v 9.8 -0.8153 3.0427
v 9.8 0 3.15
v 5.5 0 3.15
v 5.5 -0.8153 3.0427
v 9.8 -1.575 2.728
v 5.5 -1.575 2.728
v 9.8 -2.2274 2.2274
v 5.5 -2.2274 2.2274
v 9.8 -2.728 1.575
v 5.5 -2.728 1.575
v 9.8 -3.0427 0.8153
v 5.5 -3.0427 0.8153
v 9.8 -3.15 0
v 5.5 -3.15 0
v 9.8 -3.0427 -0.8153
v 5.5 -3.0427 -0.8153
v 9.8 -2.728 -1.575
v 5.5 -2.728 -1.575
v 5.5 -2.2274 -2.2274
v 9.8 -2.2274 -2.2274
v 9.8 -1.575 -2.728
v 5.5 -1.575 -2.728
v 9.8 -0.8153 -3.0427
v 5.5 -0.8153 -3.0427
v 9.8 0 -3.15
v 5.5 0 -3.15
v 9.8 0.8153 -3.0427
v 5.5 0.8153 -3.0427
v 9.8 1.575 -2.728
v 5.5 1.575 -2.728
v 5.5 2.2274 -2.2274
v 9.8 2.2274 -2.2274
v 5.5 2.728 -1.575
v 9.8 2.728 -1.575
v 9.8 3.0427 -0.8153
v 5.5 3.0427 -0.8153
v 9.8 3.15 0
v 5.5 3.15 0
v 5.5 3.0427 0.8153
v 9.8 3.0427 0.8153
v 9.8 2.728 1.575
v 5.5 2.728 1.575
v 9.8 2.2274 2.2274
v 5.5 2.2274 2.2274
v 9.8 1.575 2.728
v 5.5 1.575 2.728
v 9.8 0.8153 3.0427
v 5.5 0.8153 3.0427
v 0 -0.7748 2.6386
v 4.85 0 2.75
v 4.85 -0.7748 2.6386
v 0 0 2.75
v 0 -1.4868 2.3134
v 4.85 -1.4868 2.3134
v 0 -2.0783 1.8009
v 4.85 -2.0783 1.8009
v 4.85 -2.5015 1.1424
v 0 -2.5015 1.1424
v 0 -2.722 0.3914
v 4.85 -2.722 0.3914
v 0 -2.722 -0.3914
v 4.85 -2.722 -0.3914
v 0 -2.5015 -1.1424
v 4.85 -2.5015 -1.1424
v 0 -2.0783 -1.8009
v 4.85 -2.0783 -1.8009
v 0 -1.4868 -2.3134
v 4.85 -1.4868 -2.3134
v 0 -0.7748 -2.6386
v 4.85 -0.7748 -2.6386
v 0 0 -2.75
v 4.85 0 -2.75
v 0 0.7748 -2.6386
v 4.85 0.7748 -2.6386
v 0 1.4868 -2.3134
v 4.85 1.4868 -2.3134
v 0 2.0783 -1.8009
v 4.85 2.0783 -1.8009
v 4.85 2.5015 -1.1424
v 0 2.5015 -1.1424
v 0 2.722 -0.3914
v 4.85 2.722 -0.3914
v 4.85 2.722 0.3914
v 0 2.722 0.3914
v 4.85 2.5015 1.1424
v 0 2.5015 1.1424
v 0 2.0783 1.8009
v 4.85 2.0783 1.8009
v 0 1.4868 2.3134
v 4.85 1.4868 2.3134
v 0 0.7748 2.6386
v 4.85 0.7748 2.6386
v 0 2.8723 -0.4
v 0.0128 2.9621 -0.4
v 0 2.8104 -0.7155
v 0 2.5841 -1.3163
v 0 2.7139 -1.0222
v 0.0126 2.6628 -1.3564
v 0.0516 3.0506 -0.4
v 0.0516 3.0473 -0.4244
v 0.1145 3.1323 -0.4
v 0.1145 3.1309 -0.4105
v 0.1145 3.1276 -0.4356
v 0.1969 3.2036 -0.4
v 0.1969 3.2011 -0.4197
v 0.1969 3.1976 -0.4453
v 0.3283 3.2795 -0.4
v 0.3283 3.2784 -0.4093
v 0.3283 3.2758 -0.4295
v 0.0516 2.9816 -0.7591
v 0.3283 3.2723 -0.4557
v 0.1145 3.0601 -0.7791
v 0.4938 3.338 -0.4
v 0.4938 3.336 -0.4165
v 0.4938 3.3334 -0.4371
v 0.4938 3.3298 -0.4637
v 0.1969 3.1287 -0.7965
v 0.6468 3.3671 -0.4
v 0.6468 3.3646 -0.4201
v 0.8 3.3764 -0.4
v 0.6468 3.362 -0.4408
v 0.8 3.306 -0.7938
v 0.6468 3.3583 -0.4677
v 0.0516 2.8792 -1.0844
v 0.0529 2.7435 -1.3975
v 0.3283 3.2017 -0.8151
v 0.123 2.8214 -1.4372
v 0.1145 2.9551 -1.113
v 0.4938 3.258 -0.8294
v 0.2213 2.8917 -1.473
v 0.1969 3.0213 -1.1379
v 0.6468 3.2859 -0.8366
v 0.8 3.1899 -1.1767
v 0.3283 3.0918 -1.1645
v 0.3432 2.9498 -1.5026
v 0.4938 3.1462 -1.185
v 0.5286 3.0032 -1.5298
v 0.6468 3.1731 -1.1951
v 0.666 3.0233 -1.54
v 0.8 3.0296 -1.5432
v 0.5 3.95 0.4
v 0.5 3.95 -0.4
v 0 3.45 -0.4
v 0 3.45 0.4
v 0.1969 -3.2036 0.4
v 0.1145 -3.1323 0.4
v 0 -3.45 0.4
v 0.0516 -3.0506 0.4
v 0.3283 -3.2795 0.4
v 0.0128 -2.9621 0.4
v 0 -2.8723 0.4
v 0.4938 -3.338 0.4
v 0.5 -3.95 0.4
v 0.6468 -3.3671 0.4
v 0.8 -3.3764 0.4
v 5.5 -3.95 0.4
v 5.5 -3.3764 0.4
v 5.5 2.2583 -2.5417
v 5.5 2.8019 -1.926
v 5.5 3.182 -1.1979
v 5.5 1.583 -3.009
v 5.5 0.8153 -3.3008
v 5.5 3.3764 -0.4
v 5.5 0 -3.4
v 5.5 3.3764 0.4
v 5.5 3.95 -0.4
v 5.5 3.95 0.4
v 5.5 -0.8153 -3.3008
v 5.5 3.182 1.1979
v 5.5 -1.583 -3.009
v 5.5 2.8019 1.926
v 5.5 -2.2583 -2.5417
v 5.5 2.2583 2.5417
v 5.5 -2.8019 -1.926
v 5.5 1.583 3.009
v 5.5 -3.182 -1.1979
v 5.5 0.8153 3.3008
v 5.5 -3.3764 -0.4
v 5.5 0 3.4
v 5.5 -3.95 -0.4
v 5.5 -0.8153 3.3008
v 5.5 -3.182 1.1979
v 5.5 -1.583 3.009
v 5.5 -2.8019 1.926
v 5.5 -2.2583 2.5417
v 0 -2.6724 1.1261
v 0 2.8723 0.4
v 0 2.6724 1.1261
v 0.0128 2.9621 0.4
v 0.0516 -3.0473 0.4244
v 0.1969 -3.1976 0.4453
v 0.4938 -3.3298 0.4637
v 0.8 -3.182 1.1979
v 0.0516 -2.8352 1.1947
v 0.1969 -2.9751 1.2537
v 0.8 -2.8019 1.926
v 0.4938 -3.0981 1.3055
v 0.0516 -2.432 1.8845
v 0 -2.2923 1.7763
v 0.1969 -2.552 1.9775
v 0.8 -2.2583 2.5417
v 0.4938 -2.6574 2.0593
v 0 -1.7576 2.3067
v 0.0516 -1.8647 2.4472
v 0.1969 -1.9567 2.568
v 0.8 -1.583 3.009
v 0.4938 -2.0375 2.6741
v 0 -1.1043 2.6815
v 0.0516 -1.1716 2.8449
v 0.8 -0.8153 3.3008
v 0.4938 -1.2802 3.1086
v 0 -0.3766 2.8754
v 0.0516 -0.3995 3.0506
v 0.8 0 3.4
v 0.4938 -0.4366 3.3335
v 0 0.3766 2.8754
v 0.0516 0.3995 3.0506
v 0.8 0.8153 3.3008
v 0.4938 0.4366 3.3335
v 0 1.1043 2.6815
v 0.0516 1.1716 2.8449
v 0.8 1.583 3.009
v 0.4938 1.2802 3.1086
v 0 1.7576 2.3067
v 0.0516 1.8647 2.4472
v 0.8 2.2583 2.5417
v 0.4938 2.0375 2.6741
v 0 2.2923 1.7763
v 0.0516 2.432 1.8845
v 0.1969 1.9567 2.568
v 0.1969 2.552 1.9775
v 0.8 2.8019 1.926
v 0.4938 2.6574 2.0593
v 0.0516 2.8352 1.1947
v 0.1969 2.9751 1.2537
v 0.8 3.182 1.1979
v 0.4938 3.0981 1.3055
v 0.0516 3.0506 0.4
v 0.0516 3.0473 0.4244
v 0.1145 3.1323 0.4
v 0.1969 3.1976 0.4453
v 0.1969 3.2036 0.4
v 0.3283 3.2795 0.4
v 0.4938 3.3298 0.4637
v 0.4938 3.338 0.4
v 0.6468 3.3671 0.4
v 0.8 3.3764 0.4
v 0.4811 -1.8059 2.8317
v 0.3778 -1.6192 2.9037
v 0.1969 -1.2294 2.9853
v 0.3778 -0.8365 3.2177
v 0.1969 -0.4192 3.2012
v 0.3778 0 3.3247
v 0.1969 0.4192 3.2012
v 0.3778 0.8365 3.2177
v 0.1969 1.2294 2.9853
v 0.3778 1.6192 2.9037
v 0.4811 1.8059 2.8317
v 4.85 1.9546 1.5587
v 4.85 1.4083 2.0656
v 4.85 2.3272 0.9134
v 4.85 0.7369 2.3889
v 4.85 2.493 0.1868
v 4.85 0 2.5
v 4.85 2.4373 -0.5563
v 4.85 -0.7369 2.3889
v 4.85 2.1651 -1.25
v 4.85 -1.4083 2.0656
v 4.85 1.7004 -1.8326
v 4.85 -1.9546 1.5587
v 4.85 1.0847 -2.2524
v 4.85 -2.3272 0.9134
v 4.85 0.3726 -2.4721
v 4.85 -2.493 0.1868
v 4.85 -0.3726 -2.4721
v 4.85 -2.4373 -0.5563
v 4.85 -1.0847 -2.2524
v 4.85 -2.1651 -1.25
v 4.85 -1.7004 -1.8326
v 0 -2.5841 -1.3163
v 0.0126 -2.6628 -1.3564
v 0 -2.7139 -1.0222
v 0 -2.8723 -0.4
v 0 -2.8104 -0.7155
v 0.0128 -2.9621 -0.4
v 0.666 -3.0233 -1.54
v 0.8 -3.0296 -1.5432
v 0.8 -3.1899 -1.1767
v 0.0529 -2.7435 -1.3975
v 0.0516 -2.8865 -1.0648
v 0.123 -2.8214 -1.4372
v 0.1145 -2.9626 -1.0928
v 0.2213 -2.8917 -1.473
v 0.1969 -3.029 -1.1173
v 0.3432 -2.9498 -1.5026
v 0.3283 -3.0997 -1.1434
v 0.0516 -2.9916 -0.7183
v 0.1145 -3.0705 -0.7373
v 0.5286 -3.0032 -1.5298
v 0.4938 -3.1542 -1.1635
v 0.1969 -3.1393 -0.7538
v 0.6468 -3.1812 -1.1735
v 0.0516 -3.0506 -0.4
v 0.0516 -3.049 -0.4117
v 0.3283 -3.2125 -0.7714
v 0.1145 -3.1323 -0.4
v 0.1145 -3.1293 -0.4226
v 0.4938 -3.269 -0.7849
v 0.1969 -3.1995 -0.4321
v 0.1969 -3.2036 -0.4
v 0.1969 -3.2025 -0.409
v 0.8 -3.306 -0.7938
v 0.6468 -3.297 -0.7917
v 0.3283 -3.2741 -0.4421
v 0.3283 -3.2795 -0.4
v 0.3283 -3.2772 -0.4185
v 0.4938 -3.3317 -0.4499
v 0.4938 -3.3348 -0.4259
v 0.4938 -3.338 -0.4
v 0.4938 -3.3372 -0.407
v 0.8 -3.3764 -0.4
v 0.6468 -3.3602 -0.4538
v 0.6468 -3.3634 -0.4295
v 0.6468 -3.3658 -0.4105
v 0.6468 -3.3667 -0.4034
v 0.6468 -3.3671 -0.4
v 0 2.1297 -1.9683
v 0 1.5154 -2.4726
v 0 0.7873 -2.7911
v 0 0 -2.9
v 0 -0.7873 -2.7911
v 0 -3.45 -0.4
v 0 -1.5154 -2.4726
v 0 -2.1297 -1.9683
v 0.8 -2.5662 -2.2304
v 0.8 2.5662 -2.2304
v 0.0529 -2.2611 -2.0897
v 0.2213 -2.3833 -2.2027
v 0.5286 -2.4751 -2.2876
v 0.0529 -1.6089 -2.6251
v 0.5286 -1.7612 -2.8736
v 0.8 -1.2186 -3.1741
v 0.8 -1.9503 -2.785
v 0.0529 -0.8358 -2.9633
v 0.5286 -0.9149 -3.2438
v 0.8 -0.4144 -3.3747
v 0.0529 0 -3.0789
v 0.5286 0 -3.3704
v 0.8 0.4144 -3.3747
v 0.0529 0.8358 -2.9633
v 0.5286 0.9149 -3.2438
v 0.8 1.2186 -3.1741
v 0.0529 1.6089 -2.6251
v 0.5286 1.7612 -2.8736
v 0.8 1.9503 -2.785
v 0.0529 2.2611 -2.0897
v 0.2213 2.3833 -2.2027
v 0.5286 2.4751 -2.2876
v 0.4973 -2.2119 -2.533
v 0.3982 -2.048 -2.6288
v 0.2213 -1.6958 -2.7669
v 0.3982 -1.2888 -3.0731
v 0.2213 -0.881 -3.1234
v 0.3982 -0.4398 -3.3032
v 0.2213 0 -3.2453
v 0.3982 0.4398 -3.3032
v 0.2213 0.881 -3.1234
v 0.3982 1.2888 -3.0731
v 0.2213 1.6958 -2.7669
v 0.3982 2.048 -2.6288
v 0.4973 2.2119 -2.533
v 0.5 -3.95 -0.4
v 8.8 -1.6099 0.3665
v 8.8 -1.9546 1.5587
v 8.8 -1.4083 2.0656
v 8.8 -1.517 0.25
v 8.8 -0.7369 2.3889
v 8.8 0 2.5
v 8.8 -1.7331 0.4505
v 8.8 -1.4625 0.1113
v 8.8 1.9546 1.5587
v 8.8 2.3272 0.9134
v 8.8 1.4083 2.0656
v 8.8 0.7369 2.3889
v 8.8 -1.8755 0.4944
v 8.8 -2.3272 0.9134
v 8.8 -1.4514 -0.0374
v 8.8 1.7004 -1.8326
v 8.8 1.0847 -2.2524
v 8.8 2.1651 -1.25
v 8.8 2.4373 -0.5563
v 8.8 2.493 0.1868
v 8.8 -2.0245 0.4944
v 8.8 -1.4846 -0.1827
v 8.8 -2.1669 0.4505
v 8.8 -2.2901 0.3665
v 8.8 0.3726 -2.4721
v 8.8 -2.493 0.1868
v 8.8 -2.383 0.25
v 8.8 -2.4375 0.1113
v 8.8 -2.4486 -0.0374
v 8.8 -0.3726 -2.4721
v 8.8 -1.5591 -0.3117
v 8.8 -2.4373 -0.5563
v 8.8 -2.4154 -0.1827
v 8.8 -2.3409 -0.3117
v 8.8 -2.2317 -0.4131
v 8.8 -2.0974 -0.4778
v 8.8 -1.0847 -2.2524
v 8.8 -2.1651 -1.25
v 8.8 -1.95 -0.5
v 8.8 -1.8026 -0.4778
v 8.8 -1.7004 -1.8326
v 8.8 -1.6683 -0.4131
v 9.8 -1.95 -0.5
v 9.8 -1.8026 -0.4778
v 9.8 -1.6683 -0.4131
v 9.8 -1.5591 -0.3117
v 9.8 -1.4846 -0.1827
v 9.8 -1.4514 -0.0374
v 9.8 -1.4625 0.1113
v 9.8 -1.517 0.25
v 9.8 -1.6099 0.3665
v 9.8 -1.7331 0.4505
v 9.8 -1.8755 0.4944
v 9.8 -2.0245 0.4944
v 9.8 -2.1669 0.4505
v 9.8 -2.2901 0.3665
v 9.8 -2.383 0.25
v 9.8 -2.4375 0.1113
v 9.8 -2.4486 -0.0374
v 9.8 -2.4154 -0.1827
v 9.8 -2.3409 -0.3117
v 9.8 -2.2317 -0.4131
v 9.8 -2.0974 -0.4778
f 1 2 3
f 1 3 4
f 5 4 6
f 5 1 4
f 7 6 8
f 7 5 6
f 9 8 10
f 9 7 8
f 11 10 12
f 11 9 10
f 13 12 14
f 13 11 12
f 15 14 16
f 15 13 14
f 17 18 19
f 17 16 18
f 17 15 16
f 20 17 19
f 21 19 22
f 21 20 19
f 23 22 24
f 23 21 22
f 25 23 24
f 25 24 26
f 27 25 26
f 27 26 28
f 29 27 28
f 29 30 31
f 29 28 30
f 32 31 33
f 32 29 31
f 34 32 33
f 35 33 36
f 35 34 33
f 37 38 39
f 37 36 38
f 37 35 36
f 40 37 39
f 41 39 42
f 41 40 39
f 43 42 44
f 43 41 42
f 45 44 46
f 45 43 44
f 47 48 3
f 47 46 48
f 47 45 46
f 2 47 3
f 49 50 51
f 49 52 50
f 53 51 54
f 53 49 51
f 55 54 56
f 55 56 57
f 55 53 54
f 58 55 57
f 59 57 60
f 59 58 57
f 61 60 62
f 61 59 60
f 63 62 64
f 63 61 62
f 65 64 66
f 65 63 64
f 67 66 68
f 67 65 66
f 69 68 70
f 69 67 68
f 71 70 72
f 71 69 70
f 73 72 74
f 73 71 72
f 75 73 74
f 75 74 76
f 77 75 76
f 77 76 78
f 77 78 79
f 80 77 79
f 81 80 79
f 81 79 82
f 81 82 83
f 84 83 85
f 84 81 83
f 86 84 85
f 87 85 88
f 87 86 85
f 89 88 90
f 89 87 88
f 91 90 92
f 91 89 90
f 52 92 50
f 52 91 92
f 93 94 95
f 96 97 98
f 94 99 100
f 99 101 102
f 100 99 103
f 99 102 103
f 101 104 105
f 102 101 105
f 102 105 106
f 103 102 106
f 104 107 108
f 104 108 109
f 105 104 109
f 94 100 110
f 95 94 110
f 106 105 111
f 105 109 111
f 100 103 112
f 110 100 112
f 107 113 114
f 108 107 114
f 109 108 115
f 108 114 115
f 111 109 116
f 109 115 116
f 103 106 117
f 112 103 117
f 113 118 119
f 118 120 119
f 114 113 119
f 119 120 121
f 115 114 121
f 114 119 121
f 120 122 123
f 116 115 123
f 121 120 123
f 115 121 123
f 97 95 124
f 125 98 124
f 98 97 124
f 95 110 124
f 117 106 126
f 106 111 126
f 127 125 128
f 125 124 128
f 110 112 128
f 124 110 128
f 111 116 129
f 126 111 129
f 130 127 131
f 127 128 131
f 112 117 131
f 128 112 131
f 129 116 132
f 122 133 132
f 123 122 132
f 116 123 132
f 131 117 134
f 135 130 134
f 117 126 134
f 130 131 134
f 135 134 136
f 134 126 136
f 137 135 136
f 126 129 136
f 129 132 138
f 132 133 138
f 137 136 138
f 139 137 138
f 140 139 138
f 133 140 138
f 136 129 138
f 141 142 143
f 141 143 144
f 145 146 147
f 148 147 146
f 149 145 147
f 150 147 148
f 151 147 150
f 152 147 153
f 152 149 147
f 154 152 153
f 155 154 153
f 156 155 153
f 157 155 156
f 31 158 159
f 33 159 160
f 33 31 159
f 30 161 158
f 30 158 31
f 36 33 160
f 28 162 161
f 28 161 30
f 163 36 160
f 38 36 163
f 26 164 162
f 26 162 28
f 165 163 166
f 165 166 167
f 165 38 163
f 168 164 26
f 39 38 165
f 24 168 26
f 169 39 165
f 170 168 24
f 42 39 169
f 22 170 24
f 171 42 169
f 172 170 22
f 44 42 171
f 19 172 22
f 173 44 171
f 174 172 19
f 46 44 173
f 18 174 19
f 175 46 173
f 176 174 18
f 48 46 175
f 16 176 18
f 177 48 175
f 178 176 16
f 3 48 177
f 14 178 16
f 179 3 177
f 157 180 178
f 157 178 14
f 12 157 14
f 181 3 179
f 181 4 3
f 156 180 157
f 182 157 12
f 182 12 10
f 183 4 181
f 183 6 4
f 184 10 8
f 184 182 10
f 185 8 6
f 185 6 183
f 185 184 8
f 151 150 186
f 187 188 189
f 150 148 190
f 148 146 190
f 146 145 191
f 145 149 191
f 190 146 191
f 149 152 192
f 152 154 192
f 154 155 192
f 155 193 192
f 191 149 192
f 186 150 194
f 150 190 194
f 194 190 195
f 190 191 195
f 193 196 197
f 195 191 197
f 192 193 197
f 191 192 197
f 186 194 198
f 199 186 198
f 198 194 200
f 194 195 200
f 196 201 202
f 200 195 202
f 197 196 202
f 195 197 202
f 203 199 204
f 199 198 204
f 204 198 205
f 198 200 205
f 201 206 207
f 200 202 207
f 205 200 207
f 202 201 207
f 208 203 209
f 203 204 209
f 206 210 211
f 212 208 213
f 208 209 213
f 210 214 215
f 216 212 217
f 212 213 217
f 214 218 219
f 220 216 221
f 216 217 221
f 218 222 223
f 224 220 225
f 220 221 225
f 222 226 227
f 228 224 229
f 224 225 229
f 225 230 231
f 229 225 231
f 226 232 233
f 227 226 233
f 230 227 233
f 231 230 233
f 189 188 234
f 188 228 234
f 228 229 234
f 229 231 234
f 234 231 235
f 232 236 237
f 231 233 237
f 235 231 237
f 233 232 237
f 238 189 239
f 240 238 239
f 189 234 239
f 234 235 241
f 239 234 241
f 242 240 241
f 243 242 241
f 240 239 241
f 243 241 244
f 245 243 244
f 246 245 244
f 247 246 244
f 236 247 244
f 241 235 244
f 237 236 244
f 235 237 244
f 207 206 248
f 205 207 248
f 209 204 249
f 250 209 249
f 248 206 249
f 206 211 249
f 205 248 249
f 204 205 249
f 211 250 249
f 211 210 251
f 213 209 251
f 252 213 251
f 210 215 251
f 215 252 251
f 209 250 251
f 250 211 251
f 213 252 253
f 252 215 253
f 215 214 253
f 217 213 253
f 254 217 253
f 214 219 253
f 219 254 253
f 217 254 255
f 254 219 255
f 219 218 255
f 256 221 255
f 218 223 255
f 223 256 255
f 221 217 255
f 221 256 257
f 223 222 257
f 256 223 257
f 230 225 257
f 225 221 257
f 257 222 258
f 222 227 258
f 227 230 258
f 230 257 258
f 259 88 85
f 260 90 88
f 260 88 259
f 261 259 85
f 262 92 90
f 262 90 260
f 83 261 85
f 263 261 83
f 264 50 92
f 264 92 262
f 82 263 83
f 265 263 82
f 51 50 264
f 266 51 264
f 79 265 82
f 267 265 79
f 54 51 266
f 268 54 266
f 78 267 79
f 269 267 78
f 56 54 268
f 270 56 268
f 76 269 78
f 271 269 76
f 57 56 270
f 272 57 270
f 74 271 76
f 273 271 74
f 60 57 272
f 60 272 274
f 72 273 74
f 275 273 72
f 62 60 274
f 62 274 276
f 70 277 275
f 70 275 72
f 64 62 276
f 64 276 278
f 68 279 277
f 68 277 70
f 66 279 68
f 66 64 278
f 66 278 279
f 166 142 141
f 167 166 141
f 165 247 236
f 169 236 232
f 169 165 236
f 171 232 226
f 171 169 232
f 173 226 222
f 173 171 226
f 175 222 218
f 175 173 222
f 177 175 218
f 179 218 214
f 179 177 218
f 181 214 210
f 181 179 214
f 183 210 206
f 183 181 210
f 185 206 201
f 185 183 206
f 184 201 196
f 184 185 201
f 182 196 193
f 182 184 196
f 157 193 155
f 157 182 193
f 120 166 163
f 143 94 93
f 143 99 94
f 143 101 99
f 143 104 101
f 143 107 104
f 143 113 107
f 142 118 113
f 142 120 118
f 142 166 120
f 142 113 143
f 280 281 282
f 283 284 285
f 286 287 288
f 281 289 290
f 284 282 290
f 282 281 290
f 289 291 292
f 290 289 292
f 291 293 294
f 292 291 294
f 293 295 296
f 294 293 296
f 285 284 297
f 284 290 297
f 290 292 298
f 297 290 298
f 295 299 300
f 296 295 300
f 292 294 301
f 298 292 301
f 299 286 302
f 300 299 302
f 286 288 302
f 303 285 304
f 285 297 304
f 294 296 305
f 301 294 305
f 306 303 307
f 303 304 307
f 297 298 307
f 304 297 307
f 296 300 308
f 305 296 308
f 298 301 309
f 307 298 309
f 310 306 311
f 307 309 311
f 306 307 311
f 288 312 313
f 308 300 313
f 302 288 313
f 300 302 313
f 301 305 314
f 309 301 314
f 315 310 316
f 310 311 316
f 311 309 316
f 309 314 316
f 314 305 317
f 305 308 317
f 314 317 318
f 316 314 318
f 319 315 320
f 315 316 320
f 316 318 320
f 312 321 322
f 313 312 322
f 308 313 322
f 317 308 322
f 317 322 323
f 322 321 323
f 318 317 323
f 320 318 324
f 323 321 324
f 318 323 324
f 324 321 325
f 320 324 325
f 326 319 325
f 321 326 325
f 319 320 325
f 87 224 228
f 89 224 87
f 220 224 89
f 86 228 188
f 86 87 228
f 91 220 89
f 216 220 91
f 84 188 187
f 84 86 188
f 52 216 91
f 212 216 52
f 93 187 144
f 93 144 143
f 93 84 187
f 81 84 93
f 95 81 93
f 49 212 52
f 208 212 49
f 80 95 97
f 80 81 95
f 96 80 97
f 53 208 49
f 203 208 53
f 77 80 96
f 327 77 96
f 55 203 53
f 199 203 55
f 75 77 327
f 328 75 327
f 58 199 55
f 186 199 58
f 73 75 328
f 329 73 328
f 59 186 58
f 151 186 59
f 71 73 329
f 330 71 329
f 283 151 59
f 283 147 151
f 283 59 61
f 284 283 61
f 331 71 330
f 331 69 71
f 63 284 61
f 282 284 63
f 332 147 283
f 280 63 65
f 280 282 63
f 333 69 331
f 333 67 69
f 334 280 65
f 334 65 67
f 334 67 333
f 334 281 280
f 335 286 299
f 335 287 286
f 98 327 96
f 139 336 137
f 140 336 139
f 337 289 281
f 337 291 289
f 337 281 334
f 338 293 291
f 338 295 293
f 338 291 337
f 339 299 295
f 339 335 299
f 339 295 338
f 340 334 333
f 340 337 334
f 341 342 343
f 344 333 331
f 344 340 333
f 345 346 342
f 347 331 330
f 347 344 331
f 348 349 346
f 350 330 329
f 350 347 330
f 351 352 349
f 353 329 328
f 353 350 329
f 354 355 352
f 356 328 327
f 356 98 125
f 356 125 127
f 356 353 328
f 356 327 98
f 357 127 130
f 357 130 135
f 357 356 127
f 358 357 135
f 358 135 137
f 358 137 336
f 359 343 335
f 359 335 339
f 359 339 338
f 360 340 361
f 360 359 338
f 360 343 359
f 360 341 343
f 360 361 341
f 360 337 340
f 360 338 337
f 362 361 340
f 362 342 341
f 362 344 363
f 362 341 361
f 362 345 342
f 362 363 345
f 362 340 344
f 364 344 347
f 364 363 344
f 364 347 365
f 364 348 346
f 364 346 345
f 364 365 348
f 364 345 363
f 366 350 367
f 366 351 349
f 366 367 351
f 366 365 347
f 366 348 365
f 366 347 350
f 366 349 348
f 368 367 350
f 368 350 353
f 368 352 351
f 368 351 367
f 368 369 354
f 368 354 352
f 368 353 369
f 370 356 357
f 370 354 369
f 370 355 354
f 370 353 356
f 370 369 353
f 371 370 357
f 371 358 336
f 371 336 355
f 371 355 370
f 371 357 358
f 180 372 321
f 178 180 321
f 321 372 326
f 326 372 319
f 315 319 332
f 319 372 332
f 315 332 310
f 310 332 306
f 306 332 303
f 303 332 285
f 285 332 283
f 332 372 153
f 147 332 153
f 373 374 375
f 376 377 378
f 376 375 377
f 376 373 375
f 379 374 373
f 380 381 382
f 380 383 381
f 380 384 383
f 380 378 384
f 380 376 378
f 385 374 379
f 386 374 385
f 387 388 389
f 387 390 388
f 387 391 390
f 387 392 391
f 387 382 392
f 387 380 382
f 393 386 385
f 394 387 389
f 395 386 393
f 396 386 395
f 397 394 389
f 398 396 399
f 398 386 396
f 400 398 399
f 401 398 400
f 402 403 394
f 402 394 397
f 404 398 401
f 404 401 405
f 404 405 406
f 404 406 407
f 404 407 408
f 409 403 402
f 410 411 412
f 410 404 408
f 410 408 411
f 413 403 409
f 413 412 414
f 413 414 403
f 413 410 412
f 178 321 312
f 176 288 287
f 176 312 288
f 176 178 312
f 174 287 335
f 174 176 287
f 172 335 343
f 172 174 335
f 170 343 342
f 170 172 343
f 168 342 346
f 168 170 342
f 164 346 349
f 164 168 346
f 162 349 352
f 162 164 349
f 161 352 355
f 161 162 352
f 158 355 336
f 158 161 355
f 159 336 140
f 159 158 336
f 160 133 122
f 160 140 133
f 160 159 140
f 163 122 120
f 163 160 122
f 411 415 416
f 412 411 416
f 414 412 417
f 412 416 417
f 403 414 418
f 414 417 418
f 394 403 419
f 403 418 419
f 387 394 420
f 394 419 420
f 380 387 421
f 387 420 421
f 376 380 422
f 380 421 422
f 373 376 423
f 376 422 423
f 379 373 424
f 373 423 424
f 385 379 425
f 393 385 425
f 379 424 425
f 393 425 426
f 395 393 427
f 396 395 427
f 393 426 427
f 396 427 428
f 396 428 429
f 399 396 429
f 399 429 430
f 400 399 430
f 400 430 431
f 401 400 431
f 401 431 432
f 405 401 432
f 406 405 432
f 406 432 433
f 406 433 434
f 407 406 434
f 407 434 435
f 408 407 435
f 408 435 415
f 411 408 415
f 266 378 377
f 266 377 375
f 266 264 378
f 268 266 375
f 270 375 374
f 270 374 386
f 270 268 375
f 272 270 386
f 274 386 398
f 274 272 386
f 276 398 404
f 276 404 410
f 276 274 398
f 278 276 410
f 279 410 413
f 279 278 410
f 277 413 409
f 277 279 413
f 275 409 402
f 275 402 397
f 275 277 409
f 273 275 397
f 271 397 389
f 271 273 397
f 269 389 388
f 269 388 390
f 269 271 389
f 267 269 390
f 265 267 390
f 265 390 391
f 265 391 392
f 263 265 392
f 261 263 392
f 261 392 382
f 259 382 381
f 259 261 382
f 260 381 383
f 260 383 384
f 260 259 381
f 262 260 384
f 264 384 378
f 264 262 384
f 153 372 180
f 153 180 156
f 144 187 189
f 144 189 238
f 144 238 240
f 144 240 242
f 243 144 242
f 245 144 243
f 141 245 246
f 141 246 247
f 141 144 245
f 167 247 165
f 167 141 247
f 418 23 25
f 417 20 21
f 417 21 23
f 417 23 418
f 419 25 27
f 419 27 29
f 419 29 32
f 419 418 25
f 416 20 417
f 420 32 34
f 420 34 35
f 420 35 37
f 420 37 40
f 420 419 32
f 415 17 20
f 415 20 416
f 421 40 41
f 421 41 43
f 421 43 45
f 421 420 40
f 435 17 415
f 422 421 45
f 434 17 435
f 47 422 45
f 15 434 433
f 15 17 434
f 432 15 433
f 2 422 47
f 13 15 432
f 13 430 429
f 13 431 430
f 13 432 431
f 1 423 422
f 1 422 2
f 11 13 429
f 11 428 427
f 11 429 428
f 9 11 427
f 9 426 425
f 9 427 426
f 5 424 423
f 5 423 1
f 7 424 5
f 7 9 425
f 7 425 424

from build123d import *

# Parameters (mm, degrees)
SKETCH2_W           = 0.8
SKETCH2_H           = 1
BOSS_EXTRUDE1_DEPTH = 5.5
CHAMFER1_SIZE       = 0.5
FILLET1_SIZE        = 0.5
FILLET1_SIZE_2      = 0.8
SKETCH3_R           = 0.5
CUT_EXTRUDE1_DEPTH  = 10


with BuildPart() as part:
    # Sketch1 → Revolve1 (revolve)
    with BuildSketch(Plane.XY, mode=Mode.PRIVATE) as revolve1_sk:
        Polygon((8.8, 0), (8.8, 2.5), (4.85, 2.5), (4.85, 2.75), (0, 2.75), (0, 3.4), (5.5, 3.4), (5.5, 3.15), (9.8, 3.15), (9.8, 0), align=None)
    revolve(revolve1_sk.sketch.rotate(Axis((0, 0, 0), (1, 0, 0)), 90), axis=Axis((0, 0, 0), (1, 0, 0)))

    # Sketch2 → Boss-Extrude1 (add)
    with BuildSketch(Plane.ZY):
        with Locations((0, 3.45)):
            Rectangle(SKETCH2_W, SKETCH2_H)
        with Locations((0, -3.45)):
            Rectangle(SKETCH2_W, SKETCH2_H)
    extrude(amount=-BOSS_EXTRUDE1_DEPTH)

    # Chamfer1
    chamfer1_edges = [part.edges().sort_by_distance(p)[0] for p in [
        (0, 3.95, 0),
        (0, -3.95, 0),
    ]]
    chamfer(chamfer1_edges, length=CHAMFER1_SIZE)

    # Fillet1
    # an asymmetric fillet: 0.8, 0.5 mm, written as the material it takes off along each edge
    with BuildSketch(Plane(origin=(0, 0, 0), x_dir=(0, -0.8910585432976912, -0.45388839202627373), z_dir=(0, 0.45388839202627373, -0.8910585432976912))) as fillet1_piece_1_section:
        with BuildLine():
            Bezier((3.4 - FILLET1_SIZE, 0), (3.4, 0), (3.4, -FILLET1_SIZE_2), weights=[1, 0.707106781, 1])
            Line((3.4, -FILLET1_SIZE_2), (3.4, 0))
            Line((3.4, 0), (3.4 - FILLET1_SIZE, 0))
        make_face()
    fillet1_piece_1 = revolve(axis=Axis((0, 0, 0), (-1, 0, 0)), revolution_arc=233.986868401, mode=Mode.PRIVATE)
    fillet1_piece_1 = split(fillet1_piece_1, bisect_by=Plane(origin=(0.182093779, -3.13232652, -0.4), z_dir=(0, 0, -1)), keep=Keep.TOP, mode=Mode.PRIVATE)
    add(fillet1_piece_1, mode=Mode.SUBTRACT)
    with BuildSketch(Plane(origin=(0, 0, 0), x_dir=(0, -0.8910585432976912, -0.45388839202627373), z_dir=(0, 0.45388839202627373, -0.8910585432976912))) as fillet1_piece_2_section:
        with BuildLine():
            Bezier((3.4 - FILLET1_SIZE, 0), (3.4, 0), (3.4, -FILLET1_SIZE_2), weights=[1, 0.707106781, 1])
            Line((3.4, -FILLET1_SIZE_2), (3.4, 0))
            Line((3.4, 0), (3.4 - FILLET1_SIZE, 0))
        make_face()
    fillet1_piece_2 = revolve(axis=Axis((0, 0, 0), (-1, 0, 0)), revolution_arc=233.986868401, mode=Mode.PRIVATE)
    fillet1_piece_2 = split(fillet1_piece_2, bisect_by=Plane(origin=(0.229357983, 0, 0.4), z_dir=(0, 0, 1)), keep=Keep.TOP, mode=Mode.PRIVATE)
    add(fillet1_piece_2, mode=Mode.SUBTRACT)
    with BuildSketch(Plane(origin=(0, 0, 0), x_dir=(0, -0.8910585432977036, 0.4538883920262497), z_dir=(0, 0.4538883920262497, 0.8910585432977036))) as fillet1_piece_3_section:
        with BuildLine():
            Bezier((3.4 - FILLET1_SIZE, 0), (3.4, 0), (3.4, FILLET1_SIZE_2), weights=[1, 0.707106781, 1])
            Line((3.4, FILLET1_SIZE_2), (3.4, 0))
            Line((3.4, 0), (3.4 - FILLET1_SIZE, 0))
        make_face()
    fillet1_piece_3 = revolve(axis=Axis((0, 0, 0), (1, 0, 0)), revolution_arc=233.986868401, mode=Mode.PRIVATE)
    fillet1_piece_3 = split(fillet1_piece_3, bisect_by=Plane(origin=(0.18209405, -3.132326501, 0.4), z_dir=(0, 0, 1)), keep=Keep.TOP, mode=Mode.PRIVATE)
    add(fillet1_piece_3, mode=Mode.SUBTRACT)
    with BuildSketch(Plane(origin=(0, 0, 0), x_dir=(0, -0.8910585432977036, 0.4538883920262497), z_dir=(0, 0.4538883920262497, 0.8910585432977036))) as fillet1_piece_4_section:
        with BuildLine():
            Bezier((3.4 - FILLET1_SIZE, 0), (3.4, 0), (3.4, FILLET1_SIZE_2), weights=[1, 0.707106781, 1])
            Line((3.4, FILLET1_SIZE_2), (3.4, 0))
            Line((3.4, 0), (3.4 - FILLET1_SIZE, 0))
        make_face()
    fillet1_piece_4 = revolve(axis=Axis((0, 0, 0), (1, 0, 0)), revolution_arc=233.986868401, mode=Mode.PRIVATE)
    fillet1_piece_4 = split(fillet1_piece_4, bisect_by=Plane(origin=(0.229357983, 0, -0.4), z_dir=(0, 0, -1)), keep=Keep.TOP, mode=Mode.PRIVATE)
    add(fillet1_piece_4, mode=Mode.SUBTRACT)

    # Sketch3 → Cut-Extrude1 (cut)
    with BuildSketch(Plane(origin=(9.8, 0, 0), x_dir=(0, 0, -1), z_dir=(1, 0, 0))):
        with Locations((0, -1.95)):
            Circle(SKETCH3_R)
    extrude(amount=-CUT_EXTRUDE1_DEPTH, mode=Mode.SUBTRACT)


solid = part.part
